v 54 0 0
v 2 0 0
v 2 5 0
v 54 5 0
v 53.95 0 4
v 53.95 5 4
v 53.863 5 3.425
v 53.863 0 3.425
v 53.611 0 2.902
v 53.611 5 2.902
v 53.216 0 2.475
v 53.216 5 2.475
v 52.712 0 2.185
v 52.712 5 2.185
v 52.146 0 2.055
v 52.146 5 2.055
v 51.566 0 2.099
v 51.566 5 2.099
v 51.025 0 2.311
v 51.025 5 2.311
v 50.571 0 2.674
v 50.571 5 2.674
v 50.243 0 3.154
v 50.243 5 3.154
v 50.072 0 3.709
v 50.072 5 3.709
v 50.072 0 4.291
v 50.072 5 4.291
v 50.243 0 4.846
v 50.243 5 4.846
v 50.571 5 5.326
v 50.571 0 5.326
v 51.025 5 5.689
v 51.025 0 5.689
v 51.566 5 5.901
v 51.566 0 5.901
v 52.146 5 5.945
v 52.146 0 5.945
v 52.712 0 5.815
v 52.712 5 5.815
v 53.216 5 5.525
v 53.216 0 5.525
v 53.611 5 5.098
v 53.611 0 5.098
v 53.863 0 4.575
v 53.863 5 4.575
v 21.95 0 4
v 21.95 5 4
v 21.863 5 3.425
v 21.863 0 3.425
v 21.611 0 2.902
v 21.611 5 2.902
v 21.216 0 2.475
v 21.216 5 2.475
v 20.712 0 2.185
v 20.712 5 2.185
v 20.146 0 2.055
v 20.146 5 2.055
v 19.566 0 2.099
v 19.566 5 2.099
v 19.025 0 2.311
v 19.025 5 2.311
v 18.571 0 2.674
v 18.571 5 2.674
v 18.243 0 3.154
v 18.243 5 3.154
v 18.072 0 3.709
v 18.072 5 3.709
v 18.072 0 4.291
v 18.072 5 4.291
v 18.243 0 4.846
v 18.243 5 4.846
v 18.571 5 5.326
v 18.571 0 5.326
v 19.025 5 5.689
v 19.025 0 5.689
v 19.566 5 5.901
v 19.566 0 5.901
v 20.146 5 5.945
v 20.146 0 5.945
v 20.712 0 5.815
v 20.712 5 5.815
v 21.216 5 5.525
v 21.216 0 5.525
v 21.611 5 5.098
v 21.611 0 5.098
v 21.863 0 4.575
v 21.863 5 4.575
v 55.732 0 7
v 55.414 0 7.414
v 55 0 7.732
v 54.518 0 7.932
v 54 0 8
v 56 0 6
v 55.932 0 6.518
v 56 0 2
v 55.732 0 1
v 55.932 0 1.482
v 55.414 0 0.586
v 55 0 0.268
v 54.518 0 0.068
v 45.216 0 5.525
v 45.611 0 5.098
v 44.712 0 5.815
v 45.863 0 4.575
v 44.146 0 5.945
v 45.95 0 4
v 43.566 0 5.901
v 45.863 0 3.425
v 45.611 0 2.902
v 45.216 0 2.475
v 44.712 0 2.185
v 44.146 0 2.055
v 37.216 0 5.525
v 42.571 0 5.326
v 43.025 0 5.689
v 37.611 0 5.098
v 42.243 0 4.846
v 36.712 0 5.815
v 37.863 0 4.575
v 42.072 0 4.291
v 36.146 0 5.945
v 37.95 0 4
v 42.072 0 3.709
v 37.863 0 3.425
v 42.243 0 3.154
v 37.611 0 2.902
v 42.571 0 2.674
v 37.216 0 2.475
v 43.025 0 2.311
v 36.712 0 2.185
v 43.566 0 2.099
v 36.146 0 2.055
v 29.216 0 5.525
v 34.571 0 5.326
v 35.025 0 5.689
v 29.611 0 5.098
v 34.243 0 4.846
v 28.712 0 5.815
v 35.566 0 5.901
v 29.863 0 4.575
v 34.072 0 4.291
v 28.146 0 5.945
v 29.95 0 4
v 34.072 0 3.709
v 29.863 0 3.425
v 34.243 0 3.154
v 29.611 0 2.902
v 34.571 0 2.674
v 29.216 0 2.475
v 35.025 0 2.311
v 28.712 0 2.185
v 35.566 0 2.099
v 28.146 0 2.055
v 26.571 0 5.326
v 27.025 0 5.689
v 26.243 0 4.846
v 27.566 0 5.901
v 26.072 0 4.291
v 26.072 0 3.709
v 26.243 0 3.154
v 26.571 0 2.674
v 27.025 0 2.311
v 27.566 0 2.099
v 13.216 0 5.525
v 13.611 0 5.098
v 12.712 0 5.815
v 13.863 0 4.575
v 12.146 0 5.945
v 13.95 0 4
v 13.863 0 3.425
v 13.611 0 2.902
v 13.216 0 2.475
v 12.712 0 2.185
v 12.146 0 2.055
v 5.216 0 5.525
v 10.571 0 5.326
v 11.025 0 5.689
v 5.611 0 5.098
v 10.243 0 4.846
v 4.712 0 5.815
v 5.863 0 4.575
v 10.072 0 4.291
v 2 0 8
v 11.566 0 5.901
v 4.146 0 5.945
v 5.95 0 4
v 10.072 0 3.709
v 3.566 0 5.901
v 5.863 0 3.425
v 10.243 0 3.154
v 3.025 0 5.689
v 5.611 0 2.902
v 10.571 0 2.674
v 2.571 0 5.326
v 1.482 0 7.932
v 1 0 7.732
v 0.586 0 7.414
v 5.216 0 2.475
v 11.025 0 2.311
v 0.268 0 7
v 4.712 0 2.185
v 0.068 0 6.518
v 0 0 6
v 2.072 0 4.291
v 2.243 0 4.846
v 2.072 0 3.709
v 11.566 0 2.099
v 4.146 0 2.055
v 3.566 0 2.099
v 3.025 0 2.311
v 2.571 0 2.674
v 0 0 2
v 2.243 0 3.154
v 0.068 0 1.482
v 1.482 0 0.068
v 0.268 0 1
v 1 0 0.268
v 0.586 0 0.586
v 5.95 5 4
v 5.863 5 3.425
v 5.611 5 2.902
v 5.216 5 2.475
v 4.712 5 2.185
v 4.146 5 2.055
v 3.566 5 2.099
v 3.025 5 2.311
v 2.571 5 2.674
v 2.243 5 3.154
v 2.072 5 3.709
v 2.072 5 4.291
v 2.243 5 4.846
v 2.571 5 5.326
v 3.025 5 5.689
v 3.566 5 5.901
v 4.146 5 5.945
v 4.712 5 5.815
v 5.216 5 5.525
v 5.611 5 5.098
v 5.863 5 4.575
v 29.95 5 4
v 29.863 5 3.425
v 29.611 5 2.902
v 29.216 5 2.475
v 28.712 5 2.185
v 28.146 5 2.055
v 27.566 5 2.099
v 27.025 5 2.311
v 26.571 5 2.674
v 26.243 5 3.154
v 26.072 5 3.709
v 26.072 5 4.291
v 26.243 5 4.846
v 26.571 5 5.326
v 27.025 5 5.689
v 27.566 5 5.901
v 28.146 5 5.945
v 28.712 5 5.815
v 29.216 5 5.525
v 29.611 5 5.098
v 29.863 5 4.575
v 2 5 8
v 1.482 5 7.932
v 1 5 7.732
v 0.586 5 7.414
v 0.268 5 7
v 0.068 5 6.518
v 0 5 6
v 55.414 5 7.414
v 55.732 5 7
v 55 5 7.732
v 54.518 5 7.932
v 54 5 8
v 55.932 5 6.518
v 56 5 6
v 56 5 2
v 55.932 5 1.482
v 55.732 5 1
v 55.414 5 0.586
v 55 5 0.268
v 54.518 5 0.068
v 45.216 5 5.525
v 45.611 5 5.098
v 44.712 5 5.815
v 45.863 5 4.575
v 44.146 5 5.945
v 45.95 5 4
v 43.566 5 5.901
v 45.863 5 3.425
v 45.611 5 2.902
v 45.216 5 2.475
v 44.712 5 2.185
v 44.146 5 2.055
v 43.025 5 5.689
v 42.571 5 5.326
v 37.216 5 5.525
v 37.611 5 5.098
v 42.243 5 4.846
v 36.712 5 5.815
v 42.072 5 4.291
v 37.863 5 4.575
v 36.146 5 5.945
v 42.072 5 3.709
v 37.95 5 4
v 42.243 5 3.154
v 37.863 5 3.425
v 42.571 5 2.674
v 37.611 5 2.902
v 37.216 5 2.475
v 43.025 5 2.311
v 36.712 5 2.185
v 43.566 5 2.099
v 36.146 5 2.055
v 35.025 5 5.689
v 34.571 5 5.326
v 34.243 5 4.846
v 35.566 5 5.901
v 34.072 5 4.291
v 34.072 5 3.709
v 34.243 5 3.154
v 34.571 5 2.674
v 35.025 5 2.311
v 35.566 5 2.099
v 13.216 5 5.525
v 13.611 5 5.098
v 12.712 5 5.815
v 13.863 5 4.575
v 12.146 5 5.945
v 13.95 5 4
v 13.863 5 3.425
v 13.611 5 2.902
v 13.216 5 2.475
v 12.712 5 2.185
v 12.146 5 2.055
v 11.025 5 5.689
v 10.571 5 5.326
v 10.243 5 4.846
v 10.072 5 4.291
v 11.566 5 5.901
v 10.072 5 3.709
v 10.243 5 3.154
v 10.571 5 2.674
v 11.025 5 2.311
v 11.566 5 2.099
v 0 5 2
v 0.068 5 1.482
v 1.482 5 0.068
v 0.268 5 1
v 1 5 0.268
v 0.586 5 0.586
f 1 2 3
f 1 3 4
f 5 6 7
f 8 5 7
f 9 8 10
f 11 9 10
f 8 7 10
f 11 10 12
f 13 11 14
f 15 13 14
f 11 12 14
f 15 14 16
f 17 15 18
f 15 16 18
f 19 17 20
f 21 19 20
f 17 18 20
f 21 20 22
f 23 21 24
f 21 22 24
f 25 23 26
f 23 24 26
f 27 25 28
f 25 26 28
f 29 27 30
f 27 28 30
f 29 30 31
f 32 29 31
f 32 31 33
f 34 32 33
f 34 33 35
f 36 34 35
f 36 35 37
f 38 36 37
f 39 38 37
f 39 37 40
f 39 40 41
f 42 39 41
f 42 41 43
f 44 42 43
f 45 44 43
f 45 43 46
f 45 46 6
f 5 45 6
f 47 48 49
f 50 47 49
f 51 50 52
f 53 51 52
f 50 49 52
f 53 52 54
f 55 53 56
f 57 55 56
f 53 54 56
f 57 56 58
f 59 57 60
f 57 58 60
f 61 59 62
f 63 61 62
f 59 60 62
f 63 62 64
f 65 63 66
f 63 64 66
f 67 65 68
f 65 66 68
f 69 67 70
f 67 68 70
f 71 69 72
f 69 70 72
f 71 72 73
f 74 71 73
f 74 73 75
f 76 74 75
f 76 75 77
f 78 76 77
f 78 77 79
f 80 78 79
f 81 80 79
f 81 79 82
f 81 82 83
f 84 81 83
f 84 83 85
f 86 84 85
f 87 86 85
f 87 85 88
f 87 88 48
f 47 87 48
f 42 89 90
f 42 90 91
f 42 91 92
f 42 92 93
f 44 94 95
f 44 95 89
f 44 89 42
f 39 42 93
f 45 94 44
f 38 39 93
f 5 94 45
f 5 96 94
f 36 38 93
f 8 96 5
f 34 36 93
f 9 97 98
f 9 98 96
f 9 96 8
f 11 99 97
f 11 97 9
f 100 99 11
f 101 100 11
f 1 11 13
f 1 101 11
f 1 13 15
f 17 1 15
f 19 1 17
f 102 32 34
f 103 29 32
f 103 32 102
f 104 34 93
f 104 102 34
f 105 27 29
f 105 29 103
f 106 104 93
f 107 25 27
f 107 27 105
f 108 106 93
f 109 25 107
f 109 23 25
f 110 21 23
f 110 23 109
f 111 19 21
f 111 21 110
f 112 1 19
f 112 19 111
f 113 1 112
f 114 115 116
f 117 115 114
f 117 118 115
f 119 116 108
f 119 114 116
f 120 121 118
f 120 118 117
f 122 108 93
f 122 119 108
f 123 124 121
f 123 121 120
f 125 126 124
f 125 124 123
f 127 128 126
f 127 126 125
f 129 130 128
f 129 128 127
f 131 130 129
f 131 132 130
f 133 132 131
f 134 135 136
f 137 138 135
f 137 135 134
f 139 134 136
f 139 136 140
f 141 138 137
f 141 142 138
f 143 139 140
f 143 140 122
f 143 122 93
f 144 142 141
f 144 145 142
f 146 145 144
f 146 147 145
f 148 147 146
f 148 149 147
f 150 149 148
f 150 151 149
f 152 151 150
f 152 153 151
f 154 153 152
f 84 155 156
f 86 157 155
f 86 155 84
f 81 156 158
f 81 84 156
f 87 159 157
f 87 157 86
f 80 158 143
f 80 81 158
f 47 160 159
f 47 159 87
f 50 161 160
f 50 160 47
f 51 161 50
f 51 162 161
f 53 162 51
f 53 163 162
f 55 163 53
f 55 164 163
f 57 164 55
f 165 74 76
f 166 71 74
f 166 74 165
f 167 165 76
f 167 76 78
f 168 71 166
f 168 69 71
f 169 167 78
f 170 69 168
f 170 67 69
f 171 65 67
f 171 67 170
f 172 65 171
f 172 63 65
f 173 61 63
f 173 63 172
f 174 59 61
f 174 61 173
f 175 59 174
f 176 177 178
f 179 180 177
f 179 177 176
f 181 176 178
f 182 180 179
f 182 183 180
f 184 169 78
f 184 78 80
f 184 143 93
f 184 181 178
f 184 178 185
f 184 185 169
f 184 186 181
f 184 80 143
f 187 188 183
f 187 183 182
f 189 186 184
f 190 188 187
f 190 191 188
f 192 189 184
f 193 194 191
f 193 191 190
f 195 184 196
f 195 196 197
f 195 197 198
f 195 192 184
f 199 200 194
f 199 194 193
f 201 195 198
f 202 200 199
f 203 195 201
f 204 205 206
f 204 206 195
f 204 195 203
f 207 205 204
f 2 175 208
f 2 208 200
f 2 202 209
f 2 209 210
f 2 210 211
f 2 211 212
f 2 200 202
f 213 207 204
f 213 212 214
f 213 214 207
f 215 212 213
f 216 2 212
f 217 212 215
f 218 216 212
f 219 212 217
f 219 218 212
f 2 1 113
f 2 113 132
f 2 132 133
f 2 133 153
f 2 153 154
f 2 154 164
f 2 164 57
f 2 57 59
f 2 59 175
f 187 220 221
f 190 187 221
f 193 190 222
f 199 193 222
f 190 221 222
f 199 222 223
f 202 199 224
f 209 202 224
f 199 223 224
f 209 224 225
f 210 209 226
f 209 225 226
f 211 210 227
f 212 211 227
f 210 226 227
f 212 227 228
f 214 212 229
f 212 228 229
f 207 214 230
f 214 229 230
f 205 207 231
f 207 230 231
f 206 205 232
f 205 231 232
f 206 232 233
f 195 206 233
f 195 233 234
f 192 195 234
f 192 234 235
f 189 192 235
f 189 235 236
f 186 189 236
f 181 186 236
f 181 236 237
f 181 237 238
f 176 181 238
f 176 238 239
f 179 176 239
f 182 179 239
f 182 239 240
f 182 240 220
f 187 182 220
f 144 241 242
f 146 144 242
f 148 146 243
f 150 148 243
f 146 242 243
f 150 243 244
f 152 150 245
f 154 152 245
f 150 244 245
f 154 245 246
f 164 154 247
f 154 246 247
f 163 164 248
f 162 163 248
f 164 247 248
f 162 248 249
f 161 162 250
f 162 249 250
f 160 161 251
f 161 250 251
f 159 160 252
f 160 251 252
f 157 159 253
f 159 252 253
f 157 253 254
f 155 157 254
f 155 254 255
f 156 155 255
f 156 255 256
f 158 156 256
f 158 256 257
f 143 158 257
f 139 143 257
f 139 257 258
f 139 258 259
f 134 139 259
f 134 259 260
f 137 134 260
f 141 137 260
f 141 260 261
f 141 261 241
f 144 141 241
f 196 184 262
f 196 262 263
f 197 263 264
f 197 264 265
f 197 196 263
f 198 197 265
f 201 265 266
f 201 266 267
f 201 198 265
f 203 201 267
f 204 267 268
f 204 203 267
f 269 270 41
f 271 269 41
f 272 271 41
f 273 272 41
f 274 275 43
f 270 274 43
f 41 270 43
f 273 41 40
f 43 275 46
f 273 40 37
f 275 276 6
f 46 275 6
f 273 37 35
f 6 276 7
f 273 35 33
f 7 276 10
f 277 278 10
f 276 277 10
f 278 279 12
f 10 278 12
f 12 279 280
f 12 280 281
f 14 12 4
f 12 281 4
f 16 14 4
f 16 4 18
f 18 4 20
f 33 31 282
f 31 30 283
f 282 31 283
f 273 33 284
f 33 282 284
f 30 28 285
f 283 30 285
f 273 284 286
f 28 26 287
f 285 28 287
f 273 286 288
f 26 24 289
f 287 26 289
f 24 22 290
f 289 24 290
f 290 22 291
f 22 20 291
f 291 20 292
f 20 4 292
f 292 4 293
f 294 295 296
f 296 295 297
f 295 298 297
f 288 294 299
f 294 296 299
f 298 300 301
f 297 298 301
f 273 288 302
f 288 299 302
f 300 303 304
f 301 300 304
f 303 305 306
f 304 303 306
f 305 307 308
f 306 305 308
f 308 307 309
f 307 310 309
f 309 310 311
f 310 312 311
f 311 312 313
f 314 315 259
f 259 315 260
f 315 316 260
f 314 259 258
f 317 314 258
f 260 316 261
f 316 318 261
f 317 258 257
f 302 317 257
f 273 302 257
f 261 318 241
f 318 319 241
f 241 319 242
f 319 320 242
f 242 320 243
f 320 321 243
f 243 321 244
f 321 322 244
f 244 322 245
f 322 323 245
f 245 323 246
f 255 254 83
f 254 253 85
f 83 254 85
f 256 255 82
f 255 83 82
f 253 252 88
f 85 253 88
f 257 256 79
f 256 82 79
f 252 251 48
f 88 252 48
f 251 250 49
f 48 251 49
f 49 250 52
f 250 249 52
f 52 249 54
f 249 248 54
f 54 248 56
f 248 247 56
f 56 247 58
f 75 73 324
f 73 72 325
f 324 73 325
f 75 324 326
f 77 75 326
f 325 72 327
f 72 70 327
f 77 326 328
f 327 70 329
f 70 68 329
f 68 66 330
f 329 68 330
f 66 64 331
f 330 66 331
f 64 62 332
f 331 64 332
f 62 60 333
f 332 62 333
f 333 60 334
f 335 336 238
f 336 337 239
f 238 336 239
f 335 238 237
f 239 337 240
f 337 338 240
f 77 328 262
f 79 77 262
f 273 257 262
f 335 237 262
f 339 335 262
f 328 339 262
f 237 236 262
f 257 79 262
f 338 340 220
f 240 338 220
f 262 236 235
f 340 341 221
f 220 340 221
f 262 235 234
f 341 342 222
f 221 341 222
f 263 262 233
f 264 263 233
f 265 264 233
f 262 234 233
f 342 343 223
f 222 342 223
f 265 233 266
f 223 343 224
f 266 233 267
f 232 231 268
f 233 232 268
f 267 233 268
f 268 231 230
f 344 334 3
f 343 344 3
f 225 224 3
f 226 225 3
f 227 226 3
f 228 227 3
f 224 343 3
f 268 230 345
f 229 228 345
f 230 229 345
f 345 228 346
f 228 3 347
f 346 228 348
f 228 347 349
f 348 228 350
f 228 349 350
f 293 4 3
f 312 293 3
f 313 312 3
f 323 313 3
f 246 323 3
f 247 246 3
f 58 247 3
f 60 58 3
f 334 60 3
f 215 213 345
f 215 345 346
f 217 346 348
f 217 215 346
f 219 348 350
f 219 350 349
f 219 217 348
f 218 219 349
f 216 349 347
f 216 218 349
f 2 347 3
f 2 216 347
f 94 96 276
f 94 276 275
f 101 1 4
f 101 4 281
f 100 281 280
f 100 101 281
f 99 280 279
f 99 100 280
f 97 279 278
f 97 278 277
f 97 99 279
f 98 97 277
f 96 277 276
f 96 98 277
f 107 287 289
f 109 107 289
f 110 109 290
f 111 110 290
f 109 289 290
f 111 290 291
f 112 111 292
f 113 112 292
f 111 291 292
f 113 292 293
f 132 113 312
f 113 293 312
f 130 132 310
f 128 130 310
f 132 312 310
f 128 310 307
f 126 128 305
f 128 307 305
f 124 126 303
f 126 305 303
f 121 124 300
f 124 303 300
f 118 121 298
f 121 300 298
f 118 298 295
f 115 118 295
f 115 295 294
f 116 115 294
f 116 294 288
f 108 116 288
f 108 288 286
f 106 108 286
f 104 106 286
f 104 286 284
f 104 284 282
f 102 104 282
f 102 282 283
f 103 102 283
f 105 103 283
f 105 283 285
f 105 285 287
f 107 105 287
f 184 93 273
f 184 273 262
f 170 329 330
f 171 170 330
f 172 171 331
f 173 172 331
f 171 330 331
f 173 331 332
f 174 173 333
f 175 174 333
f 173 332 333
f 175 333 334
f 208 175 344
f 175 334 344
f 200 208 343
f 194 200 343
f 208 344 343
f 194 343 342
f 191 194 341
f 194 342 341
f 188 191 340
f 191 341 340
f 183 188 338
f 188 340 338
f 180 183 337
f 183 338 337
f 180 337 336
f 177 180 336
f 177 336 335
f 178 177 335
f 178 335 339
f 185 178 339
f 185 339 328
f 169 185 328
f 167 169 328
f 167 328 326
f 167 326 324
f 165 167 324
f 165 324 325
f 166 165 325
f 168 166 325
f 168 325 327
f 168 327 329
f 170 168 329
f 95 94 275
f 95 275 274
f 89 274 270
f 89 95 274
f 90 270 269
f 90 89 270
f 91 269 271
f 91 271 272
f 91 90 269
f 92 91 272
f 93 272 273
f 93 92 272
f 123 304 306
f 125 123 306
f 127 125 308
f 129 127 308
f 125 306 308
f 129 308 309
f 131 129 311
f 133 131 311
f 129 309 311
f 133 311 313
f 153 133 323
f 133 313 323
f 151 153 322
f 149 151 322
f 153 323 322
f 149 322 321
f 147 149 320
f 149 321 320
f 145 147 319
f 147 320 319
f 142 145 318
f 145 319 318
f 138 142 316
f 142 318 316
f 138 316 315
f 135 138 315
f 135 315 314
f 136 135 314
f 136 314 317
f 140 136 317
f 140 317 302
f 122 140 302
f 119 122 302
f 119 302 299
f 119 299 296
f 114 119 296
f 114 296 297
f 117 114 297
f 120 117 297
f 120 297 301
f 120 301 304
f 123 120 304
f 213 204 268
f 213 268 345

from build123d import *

# Parameters (mm, degrees)
BOSS_EXTRUDE1_DEPTH = 5
SKETCH2_R           = 1.95
CUT_EXTRUDE1_DEPTH  = 6


with BuildPart() as part:
    # Sketch1 → Boss-Extrude1 (new body)
    with BuildSketch(Plane(origin=(0, 0, 0), x_dir=(1, 0, 0), z_dir=(0, 1, 0))):
        with BuildLine():
            Line((2, 0), (54, 0))
            ThreePointArc((54, 0), (55.414213562, -0.585786438), (56, -2))
            Line((56, -2), (56, -6))
            ThreePointArc((56, -6), (55.414213562, -7.414213562), (54, -8))
            Line((54, -8), (2, -8))
            ThreePointArc((2, -8), (0.585786438, -7.414213562), (0, -6))
            Line((0, -6), (0, -2))
            ThreePointArc((0, -2), (0.585786438, -0.585786438), (2, 0))
        make_face()
    extrude(amount=BOSS_EXTRUDE1_DEPTH)

    # Sketch2 → Cut-Extrude1 (cut, through all)
    with BuildSketch(Plane(origin=(0, 5, 0), x_dir=(1, 0, 0), z_dir=(0, 1, 0))):
        with Locations((52, -4)):
            Circle(SKETCH2_R)
        with Locations((44, -4)):
            Circle(SKETCH2_R)
        with Locations((-12, -4)):
            Circle(SKETCH2_R)
        with Locations((-4, -4)):
            Circle(SKETCH2_R)
        with Locations((4, -4)):
            Circle(SKETCH2_R)
        with Locations((12, -4)):
            Circle(SKETCH2_R)
        with Locations((20, -4)):
            Circle(SKETCH2_R)
        with Locations((28, -4)):
            Circle(SKETCH2_R)
        with Locations((36, -4)):
            Circle(SKETCH2_R)
    extrude(amount=-CUT_EXTRUDE1_DEPTH, mode=Mode.SUBTRACT)


solid = part.part
